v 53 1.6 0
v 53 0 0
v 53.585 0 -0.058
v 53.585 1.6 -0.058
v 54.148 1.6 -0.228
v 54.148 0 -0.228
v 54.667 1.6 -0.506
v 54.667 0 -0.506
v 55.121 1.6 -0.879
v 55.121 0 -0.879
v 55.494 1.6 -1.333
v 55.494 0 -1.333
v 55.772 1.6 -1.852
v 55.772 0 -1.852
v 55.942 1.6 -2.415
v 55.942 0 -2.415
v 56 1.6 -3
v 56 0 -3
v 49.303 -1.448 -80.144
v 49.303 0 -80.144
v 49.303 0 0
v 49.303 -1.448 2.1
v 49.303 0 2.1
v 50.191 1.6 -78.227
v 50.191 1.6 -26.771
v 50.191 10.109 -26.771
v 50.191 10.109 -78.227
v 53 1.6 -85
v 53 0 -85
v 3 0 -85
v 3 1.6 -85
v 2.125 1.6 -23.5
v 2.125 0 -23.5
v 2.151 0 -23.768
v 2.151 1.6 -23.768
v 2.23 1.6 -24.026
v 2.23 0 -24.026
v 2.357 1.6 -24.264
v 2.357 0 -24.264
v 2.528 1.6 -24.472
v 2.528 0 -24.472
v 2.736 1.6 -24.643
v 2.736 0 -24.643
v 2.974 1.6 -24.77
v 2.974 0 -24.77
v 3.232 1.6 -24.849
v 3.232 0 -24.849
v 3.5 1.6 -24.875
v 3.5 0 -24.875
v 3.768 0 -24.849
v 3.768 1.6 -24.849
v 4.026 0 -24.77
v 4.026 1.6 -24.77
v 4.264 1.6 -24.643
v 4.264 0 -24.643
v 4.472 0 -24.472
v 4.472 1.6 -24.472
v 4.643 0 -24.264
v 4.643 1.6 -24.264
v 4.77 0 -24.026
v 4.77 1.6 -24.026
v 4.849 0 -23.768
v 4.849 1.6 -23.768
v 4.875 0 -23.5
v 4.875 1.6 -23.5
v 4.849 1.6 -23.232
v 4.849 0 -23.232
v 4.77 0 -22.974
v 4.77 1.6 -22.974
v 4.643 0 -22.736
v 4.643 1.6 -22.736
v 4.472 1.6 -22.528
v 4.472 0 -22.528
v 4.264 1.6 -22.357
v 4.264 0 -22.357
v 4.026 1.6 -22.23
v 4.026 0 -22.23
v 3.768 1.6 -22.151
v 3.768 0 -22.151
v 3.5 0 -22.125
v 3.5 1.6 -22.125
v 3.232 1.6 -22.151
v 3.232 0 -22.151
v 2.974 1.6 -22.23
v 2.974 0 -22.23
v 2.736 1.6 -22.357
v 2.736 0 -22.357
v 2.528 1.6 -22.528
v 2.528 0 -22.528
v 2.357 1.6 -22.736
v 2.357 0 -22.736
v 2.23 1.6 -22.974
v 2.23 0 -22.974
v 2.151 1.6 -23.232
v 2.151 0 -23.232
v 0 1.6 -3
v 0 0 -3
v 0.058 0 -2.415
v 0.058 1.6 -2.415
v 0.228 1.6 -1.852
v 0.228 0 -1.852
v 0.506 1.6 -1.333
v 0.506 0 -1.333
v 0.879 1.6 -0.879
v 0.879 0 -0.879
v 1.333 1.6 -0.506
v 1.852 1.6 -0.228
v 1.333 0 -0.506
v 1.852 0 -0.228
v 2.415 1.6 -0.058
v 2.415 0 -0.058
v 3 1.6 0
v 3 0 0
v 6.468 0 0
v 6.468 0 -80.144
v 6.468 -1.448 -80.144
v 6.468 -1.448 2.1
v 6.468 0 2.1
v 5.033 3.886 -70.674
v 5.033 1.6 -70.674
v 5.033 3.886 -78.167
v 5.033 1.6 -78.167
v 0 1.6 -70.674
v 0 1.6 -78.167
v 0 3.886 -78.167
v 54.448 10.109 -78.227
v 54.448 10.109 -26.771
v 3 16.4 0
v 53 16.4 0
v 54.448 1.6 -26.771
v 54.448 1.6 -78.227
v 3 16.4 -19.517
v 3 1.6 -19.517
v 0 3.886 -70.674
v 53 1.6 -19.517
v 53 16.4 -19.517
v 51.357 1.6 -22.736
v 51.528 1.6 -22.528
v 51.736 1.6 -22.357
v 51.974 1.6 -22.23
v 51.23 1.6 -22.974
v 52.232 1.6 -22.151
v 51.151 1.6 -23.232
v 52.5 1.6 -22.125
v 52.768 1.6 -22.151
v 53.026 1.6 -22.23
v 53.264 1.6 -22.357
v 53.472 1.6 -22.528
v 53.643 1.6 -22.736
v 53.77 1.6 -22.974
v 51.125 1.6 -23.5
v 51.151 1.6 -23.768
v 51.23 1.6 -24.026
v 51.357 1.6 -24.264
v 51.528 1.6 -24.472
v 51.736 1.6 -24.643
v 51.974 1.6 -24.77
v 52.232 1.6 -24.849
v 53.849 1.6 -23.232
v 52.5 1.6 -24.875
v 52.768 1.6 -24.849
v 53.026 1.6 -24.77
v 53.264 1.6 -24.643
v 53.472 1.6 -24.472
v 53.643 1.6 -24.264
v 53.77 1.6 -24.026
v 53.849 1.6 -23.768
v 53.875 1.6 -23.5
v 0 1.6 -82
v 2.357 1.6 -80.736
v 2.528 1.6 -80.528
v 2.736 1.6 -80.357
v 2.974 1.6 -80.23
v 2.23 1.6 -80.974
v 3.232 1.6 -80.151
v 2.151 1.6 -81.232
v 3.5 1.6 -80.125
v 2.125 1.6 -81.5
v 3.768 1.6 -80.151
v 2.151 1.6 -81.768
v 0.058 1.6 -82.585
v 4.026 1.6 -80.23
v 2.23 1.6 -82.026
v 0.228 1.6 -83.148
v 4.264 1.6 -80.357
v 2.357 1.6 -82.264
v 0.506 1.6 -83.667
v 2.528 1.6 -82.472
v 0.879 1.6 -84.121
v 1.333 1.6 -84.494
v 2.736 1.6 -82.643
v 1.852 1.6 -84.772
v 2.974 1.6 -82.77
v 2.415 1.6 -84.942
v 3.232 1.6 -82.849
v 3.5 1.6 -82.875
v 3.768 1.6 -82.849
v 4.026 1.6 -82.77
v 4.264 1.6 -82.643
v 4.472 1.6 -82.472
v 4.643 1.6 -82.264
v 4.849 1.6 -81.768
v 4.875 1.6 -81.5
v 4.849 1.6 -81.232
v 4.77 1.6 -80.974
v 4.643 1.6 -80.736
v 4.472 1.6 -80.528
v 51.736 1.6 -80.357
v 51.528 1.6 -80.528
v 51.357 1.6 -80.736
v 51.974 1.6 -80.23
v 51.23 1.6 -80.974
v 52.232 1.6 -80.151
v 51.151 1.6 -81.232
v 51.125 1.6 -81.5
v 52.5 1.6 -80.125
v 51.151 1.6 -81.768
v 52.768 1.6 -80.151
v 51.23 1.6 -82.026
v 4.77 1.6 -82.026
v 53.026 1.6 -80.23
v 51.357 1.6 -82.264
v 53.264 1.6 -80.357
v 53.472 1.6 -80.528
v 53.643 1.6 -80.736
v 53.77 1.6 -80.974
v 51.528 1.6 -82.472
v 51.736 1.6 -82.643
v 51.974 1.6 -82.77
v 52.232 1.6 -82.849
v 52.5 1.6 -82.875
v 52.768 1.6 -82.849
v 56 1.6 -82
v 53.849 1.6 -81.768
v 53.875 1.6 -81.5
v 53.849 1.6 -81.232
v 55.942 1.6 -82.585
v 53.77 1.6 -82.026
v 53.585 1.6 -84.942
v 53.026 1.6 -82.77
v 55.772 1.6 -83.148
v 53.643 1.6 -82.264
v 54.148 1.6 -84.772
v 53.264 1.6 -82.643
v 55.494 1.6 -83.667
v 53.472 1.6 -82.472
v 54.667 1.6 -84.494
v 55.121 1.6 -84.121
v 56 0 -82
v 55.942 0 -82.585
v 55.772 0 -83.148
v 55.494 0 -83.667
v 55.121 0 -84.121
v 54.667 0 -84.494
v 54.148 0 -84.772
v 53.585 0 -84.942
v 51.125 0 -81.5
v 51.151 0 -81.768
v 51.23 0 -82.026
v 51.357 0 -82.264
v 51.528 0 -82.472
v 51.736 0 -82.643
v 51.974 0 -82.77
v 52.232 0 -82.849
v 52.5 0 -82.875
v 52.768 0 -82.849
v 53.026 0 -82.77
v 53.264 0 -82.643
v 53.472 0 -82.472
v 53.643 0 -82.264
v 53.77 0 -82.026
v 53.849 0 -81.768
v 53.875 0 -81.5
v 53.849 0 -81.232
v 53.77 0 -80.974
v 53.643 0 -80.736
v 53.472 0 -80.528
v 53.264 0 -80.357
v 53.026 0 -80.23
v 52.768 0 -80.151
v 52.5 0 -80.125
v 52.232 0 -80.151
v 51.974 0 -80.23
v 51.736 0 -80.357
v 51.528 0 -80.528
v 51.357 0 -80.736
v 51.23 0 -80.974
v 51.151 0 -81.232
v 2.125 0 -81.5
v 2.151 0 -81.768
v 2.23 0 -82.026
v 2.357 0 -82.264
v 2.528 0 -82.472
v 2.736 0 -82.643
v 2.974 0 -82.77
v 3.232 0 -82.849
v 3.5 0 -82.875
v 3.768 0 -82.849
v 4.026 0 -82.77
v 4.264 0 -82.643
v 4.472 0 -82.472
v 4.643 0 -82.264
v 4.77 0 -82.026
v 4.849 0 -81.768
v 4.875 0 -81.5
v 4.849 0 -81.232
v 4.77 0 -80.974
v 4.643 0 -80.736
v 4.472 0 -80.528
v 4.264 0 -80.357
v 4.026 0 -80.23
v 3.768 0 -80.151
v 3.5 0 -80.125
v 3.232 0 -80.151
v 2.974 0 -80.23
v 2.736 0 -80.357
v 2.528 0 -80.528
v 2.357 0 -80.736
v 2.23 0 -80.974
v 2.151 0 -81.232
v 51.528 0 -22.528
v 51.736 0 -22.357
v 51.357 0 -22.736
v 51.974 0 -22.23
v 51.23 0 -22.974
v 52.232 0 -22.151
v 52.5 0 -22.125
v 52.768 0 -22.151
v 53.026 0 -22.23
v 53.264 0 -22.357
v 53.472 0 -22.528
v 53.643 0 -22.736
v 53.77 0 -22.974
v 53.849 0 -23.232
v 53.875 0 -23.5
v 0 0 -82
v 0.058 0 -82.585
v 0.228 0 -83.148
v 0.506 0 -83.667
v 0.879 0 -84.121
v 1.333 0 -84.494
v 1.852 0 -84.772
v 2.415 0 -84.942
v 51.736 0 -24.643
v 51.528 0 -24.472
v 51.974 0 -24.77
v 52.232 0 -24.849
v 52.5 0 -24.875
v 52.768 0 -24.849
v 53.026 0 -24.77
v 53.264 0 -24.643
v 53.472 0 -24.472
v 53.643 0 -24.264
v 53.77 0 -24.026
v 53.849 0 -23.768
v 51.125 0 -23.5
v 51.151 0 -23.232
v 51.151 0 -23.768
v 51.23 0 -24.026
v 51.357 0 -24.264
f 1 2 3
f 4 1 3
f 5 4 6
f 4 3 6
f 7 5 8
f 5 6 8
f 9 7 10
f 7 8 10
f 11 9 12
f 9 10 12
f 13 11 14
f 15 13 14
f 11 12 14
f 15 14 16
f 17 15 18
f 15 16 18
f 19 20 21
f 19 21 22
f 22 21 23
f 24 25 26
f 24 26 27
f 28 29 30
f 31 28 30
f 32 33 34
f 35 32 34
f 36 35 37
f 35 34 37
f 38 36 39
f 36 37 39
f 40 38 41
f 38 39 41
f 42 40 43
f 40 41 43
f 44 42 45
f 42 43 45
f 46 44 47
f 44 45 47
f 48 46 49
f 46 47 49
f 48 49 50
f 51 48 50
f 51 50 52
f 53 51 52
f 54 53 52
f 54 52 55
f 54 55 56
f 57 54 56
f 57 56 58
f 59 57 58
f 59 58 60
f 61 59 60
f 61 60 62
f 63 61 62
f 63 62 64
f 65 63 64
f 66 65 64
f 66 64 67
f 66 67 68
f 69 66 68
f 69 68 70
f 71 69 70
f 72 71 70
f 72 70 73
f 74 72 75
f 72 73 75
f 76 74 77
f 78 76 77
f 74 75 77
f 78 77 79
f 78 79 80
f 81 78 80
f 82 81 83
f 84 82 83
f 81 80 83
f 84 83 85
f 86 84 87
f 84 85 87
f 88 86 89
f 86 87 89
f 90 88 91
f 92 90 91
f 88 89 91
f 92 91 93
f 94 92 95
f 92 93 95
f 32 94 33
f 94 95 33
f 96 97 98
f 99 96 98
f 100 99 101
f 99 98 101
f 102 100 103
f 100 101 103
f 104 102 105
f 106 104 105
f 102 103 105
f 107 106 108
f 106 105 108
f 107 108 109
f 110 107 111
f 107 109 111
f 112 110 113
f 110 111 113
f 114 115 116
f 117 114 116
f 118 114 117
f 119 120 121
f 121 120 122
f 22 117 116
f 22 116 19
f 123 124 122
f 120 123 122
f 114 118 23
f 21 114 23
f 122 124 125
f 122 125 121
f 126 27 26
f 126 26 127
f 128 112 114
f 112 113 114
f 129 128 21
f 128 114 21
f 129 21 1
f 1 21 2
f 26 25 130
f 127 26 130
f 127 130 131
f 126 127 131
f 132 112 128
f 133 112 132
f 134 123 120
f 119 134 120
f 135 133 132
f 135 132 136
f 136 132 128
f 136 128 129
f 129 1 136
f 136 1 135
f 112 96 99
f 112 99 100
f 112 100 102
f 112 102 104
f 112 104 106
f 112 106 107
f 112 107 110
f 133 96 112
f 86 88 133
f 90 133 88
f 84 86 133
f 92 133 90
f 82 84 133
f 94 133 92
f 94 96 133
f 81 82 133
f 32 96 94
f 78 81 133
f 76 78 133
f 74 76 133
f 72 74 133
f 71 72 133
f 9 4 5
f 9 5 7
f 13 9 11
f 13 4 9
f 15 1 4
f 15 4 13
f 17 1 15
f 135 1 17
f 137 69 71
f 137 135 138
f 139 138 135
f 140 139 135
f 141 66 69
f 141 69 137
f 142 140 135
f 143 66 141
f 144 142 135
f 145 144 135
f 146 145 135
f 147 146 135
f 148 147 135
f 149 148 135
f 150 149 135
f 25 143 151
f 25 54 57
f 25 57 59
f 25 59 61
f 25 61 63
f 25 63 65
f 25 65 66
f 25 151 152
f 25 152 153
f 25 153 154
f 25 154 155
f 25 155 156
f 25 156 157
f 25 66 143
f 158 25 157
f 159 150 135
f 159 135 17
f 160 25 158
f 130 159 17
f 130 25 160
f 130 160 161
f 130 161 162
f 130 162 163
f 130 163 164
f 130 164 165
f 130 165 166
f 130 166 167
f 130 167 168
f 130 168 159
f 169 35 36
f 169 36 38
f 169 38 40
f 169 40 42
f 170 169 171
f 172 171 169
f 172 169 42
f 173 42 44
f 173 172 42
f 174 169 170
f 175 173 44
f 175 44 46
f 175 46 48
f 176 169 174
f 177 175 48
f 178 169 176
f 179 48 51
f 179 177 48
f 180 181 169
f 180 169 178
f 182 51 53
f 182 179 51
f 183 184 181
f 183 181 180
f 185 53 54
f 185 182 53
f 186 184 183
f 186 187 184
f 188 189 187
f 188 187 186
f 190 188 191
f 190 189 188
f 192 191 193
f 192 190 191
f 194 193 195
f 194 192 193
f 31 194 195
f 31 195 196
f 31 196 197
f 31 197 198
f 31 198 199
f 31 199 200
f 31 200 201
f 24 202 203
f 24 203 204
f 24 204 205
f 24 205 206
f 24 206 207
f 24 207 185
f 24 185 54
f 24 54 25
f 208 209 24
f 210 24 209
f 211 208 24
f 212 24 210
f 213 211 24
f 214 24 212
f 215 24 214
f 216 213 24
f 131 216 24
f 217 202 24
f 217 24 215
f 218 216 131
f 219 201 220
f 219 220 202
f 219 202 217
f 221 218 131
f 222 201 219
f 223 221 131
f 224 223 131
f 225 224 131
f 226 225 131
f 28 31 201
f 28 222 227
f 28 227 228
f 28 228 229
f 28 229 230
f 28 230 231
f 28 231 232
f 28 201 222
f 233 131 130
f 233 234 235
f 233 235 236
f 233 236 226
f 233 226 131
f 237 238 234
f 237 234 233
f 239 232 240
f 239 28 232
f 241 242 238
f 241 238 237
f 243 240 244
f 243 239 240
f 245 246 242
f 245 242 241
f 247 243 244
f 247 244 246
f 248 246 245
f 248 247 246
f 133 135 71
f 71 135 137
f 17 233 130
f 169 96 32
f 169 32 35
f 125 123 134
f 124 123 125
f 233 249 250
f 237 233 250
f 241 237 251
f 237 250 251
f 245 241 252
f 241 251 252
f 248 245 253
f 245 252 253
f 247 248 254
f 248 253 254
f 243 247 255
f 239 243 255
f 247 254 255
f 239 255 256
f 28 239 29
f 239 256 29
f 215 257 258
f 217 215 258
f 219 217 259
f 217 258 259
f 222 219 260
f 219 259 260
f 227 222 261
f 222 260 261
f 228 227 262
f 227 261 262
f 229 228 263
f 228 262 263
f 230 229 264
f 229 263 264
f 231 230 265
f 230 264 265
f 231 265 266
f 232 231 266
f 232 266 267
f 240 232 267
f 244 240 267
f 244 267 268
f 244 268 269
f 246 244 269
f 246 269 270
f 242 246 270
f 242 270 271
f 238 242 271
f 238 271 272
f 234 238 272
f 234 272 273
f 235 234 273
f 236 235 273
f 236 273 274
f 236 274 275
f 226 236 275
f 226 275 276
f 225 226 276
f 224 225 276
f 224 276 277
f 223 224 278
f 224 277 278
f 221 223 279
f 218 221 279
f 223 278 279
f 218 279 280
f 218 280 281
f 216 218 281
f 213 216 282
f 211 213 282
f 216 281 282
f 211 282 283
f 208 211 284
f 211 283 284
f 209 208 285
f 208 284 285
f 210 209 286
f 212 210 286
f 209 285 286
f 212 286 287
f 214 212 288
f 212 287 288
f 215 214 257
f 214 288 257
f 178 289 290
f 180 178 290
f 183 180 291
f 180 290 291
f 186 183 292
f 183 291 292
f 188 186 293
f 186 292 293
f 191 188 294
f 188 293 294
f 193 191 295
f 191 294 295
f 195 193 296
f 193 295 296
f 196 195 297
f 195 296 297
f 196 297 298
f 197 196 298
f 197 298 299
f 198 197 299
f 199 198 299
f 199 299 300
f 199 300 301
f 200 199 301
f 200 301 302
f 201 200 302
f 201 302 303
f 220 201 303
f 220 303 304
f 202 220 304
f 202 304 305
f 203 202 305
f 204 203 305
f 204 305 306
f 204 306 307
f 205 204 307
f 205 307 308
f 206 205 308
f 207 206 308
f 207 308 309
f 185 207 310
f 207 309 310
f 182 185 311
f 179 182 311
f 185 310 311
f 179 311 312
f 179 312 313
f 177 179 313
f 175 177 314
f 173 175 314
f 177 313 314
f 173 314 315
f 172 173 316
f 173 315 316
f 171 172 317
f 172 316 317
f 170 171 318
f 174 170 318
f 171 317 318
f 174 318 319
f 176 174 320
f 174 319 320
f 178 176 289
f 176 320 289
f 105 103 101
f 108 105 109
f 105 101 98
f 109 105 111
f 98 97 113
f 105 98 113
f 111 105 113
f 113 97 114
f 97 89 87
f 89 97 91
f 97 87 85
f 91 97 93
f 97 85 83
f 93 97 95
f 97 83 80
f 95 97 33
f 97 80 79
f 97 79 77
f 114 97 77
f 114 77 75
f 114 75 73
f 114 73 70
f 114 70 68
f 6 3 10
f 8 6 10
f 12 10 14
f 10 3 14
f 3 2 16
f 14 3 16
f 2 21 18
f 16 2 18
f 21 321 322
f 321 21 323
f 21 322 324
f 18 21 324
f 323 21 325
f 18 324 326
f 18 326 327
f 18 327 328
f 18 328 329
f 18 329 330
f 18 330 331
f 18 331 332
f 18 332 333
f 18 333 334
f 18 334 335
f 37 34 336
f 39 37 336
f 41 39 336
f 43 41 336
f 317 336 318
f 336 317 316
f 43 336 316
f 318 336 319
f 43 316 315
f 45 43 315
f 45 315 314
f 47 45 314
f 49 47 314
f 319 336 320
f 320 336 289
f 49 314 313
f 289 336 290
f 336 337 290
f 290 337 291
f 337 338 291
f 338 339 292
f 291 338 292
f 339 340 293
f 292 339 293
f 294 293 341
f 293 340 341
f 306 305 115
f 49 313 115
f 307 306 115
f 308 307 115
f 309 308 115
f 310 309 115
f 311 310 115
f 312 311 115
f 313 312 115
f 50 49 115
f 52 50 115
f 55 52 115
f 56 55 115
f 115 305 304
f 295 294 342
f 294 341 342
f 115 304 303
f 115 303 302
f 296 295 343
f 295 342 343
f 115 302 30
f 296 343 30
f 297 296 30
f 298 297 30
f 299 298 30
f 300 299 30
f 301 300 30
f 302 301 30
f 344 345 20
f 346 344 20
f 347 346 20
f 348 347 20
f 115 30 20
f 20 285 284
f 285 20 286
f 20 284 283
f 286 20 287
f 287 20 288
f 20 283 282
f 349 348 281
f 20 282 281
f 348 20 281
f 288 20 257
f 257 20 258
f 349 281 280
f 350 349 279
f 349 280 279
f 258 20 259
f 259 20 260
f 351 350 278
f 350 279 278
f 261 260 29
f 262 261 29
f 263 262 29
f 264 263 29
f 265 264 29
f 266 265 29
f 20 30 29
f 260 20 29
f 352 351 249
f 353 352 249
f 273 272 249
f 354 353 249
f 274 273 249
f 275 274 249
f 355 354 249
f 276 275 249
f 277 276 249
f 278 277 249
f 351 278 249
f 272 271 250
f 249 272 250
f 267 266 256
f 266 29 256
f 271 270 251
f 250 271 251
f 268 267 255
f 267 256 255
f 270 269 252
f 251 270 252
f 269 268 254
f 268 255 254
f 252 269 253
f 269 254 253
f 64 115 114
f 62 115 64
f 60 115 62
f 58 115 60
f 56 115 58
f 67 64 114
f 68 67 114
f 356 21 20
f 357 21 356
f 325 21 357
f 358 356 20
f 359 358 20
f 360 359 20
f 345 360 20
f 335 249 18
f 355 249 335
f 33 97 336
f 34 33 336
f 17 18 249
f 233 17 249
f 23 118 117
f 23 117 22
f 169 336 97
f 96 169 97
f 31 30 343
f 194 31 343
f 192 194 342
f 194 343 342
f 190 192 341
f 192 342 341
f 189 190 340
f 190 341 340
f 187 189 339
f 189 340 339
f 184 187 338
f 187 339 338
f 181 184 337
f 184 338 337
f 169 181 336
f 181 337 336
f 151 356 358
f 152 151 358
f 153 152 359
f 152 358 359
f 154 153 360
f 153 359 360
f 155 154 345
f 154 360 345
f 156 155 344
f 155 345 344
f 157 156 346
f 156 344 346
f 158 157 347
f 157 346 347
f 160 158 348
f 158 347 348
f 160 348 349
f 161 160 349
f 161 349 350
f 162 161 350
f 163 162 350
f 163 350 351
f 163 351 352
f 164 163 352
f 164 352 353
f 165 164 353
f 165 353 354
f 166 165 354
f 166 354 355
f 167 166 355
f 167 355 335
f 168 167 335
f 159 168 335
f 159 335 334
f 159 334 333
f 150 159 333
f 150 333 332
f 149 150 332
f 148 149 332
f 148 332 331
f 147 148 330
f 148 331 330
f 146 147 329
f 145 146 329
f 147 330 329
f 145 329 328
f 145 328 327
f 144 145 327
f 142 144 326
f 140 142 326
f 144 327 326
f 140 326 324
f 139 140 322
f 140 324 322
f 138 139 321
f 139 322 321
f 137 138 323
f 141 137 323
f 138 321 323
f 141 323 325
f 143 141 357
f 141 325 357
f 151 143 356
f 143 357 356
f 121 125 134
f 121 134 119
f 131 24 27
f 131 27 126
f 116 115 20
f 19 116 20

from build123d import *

# Parameters (mm, degrees)
BOSS_EXTRUDE1_DEPTH        = 1.6002
F_2_7_2_7_DIAMETER_HOLE1_D = 2.75
SKETCH4_W                  = 50
SKETCH4_H                  = 19.517145321
BOSS_EXTRUDE2_DEPTH        = 14.8
SKETCH5_W                  = 42.835025658
SKETCH5_H                  = 82.243586595
BOSS_EXTRUDE3_DEPTH        = 1.4478
SKETCH6_W                  = 5.032927575
SKETCH6_H                  = 7.493
BOSS_EXTRUDE4_DEPTH        = 2.286
SKETCH7_W                  = 4.25671985
SKETCH7_H                  = 51.456231134
BOSS_EXTRUDE5_DEPTH        = 8.509


with BuildPart() as part:
    # Sketch1 → Boss-Extrude1 (new body)
    with BuildSketch(Plane(origin=(0, 0, 0), x_dir=(1, 0, 0), z_dir=(0, 1, 0))):
        with BuildLine():
            Line((3, 0), (53, 0))
            ThreePointArc((53, 0), (55.121320344, 0.878679656), (56, 3))
            Line((56, 3), (56, 82))
            ThreePointArc((56, 82), (55.121320344, 84.121320344), (53, 85))
            Line((53, 85), (3, 85))
            ThreePointArc((3, 85), (0.878679656, 84.121320344), (0, 82))
            Line((0, 82), (0, 3))
            ThreePointArc((0, 3), (0.878679656, 0.878679656), (3, 0))
        make_face()
    extrude(amount=BOSS_EXTRUDE1_DEPTH)

    # Ø2.7 (2.7) Diameter Hole1 (through all)
    with Locations(Plane(origin=(0, 1.6002, 0), x_dir=(1, 0, 0), z_dir=(0, 1, 0))):
        with Locations((3.5, 81.5), (3.5, 23.5), (52.5, 81.5), (52.5, 23.5)):
            Hole(F_2_7_2_7_DIAMETER_HOLE1_D / 2)

    # Sketch4 → Boss-Extrude2 (add)
    with BuildSketch(Plane(origin=(0, 1.6002, 0), x_dir=(1, 0, 0), z_dir=(0, 1, 0))):
        with Locations((28, 9.758572661)):
            Rectangle(SKETCH4_W, SKETCH4_H)
    extrude(amount=BOSS_EXTRUDE2_DEPTH)

    # Sketch5 → Boss-Extrude3 (add)
    with BuildSketch(Plane.XZ):
        with Locations((27.885782236, -39.021793298)):
            Rectangle(SKETCH5_W, SKETCH5_H)
    extrude(amount=BOSS_EXTRUDE3_DEPTH)

    # Sketch7 → Boss-Extrude5 (add)
    with BuildSketch(Plane(origin=(0, 1.6002, 0), x_dir=(1, 0, 0), z_dir=(0, 1, 0))):
        with Locations((52.319642087, 52.498691965)):
            Rectangle(SKETCH7_W, SKETCH7_H)
    extrude(amount=BOSS_EXTRUDE5_DEPTH)


with BuildPart() as body_2:
    # Sketch6 → Boss-Extrude4 (new body)
    with BuildSketch(Plane(origin=(0, 1.6002, 0), x_dir=(1, 0, 0), z_dir=(0, 1, 0))):
        with Locations((2.516463788, 74.4209)):
            Rectangle(SKETCH6_W, SKETCH6_H)
    extrude(amount=BOSS_EXTRUDE4_DEPTH)


solid = Compound([part.part, body_2.part])
